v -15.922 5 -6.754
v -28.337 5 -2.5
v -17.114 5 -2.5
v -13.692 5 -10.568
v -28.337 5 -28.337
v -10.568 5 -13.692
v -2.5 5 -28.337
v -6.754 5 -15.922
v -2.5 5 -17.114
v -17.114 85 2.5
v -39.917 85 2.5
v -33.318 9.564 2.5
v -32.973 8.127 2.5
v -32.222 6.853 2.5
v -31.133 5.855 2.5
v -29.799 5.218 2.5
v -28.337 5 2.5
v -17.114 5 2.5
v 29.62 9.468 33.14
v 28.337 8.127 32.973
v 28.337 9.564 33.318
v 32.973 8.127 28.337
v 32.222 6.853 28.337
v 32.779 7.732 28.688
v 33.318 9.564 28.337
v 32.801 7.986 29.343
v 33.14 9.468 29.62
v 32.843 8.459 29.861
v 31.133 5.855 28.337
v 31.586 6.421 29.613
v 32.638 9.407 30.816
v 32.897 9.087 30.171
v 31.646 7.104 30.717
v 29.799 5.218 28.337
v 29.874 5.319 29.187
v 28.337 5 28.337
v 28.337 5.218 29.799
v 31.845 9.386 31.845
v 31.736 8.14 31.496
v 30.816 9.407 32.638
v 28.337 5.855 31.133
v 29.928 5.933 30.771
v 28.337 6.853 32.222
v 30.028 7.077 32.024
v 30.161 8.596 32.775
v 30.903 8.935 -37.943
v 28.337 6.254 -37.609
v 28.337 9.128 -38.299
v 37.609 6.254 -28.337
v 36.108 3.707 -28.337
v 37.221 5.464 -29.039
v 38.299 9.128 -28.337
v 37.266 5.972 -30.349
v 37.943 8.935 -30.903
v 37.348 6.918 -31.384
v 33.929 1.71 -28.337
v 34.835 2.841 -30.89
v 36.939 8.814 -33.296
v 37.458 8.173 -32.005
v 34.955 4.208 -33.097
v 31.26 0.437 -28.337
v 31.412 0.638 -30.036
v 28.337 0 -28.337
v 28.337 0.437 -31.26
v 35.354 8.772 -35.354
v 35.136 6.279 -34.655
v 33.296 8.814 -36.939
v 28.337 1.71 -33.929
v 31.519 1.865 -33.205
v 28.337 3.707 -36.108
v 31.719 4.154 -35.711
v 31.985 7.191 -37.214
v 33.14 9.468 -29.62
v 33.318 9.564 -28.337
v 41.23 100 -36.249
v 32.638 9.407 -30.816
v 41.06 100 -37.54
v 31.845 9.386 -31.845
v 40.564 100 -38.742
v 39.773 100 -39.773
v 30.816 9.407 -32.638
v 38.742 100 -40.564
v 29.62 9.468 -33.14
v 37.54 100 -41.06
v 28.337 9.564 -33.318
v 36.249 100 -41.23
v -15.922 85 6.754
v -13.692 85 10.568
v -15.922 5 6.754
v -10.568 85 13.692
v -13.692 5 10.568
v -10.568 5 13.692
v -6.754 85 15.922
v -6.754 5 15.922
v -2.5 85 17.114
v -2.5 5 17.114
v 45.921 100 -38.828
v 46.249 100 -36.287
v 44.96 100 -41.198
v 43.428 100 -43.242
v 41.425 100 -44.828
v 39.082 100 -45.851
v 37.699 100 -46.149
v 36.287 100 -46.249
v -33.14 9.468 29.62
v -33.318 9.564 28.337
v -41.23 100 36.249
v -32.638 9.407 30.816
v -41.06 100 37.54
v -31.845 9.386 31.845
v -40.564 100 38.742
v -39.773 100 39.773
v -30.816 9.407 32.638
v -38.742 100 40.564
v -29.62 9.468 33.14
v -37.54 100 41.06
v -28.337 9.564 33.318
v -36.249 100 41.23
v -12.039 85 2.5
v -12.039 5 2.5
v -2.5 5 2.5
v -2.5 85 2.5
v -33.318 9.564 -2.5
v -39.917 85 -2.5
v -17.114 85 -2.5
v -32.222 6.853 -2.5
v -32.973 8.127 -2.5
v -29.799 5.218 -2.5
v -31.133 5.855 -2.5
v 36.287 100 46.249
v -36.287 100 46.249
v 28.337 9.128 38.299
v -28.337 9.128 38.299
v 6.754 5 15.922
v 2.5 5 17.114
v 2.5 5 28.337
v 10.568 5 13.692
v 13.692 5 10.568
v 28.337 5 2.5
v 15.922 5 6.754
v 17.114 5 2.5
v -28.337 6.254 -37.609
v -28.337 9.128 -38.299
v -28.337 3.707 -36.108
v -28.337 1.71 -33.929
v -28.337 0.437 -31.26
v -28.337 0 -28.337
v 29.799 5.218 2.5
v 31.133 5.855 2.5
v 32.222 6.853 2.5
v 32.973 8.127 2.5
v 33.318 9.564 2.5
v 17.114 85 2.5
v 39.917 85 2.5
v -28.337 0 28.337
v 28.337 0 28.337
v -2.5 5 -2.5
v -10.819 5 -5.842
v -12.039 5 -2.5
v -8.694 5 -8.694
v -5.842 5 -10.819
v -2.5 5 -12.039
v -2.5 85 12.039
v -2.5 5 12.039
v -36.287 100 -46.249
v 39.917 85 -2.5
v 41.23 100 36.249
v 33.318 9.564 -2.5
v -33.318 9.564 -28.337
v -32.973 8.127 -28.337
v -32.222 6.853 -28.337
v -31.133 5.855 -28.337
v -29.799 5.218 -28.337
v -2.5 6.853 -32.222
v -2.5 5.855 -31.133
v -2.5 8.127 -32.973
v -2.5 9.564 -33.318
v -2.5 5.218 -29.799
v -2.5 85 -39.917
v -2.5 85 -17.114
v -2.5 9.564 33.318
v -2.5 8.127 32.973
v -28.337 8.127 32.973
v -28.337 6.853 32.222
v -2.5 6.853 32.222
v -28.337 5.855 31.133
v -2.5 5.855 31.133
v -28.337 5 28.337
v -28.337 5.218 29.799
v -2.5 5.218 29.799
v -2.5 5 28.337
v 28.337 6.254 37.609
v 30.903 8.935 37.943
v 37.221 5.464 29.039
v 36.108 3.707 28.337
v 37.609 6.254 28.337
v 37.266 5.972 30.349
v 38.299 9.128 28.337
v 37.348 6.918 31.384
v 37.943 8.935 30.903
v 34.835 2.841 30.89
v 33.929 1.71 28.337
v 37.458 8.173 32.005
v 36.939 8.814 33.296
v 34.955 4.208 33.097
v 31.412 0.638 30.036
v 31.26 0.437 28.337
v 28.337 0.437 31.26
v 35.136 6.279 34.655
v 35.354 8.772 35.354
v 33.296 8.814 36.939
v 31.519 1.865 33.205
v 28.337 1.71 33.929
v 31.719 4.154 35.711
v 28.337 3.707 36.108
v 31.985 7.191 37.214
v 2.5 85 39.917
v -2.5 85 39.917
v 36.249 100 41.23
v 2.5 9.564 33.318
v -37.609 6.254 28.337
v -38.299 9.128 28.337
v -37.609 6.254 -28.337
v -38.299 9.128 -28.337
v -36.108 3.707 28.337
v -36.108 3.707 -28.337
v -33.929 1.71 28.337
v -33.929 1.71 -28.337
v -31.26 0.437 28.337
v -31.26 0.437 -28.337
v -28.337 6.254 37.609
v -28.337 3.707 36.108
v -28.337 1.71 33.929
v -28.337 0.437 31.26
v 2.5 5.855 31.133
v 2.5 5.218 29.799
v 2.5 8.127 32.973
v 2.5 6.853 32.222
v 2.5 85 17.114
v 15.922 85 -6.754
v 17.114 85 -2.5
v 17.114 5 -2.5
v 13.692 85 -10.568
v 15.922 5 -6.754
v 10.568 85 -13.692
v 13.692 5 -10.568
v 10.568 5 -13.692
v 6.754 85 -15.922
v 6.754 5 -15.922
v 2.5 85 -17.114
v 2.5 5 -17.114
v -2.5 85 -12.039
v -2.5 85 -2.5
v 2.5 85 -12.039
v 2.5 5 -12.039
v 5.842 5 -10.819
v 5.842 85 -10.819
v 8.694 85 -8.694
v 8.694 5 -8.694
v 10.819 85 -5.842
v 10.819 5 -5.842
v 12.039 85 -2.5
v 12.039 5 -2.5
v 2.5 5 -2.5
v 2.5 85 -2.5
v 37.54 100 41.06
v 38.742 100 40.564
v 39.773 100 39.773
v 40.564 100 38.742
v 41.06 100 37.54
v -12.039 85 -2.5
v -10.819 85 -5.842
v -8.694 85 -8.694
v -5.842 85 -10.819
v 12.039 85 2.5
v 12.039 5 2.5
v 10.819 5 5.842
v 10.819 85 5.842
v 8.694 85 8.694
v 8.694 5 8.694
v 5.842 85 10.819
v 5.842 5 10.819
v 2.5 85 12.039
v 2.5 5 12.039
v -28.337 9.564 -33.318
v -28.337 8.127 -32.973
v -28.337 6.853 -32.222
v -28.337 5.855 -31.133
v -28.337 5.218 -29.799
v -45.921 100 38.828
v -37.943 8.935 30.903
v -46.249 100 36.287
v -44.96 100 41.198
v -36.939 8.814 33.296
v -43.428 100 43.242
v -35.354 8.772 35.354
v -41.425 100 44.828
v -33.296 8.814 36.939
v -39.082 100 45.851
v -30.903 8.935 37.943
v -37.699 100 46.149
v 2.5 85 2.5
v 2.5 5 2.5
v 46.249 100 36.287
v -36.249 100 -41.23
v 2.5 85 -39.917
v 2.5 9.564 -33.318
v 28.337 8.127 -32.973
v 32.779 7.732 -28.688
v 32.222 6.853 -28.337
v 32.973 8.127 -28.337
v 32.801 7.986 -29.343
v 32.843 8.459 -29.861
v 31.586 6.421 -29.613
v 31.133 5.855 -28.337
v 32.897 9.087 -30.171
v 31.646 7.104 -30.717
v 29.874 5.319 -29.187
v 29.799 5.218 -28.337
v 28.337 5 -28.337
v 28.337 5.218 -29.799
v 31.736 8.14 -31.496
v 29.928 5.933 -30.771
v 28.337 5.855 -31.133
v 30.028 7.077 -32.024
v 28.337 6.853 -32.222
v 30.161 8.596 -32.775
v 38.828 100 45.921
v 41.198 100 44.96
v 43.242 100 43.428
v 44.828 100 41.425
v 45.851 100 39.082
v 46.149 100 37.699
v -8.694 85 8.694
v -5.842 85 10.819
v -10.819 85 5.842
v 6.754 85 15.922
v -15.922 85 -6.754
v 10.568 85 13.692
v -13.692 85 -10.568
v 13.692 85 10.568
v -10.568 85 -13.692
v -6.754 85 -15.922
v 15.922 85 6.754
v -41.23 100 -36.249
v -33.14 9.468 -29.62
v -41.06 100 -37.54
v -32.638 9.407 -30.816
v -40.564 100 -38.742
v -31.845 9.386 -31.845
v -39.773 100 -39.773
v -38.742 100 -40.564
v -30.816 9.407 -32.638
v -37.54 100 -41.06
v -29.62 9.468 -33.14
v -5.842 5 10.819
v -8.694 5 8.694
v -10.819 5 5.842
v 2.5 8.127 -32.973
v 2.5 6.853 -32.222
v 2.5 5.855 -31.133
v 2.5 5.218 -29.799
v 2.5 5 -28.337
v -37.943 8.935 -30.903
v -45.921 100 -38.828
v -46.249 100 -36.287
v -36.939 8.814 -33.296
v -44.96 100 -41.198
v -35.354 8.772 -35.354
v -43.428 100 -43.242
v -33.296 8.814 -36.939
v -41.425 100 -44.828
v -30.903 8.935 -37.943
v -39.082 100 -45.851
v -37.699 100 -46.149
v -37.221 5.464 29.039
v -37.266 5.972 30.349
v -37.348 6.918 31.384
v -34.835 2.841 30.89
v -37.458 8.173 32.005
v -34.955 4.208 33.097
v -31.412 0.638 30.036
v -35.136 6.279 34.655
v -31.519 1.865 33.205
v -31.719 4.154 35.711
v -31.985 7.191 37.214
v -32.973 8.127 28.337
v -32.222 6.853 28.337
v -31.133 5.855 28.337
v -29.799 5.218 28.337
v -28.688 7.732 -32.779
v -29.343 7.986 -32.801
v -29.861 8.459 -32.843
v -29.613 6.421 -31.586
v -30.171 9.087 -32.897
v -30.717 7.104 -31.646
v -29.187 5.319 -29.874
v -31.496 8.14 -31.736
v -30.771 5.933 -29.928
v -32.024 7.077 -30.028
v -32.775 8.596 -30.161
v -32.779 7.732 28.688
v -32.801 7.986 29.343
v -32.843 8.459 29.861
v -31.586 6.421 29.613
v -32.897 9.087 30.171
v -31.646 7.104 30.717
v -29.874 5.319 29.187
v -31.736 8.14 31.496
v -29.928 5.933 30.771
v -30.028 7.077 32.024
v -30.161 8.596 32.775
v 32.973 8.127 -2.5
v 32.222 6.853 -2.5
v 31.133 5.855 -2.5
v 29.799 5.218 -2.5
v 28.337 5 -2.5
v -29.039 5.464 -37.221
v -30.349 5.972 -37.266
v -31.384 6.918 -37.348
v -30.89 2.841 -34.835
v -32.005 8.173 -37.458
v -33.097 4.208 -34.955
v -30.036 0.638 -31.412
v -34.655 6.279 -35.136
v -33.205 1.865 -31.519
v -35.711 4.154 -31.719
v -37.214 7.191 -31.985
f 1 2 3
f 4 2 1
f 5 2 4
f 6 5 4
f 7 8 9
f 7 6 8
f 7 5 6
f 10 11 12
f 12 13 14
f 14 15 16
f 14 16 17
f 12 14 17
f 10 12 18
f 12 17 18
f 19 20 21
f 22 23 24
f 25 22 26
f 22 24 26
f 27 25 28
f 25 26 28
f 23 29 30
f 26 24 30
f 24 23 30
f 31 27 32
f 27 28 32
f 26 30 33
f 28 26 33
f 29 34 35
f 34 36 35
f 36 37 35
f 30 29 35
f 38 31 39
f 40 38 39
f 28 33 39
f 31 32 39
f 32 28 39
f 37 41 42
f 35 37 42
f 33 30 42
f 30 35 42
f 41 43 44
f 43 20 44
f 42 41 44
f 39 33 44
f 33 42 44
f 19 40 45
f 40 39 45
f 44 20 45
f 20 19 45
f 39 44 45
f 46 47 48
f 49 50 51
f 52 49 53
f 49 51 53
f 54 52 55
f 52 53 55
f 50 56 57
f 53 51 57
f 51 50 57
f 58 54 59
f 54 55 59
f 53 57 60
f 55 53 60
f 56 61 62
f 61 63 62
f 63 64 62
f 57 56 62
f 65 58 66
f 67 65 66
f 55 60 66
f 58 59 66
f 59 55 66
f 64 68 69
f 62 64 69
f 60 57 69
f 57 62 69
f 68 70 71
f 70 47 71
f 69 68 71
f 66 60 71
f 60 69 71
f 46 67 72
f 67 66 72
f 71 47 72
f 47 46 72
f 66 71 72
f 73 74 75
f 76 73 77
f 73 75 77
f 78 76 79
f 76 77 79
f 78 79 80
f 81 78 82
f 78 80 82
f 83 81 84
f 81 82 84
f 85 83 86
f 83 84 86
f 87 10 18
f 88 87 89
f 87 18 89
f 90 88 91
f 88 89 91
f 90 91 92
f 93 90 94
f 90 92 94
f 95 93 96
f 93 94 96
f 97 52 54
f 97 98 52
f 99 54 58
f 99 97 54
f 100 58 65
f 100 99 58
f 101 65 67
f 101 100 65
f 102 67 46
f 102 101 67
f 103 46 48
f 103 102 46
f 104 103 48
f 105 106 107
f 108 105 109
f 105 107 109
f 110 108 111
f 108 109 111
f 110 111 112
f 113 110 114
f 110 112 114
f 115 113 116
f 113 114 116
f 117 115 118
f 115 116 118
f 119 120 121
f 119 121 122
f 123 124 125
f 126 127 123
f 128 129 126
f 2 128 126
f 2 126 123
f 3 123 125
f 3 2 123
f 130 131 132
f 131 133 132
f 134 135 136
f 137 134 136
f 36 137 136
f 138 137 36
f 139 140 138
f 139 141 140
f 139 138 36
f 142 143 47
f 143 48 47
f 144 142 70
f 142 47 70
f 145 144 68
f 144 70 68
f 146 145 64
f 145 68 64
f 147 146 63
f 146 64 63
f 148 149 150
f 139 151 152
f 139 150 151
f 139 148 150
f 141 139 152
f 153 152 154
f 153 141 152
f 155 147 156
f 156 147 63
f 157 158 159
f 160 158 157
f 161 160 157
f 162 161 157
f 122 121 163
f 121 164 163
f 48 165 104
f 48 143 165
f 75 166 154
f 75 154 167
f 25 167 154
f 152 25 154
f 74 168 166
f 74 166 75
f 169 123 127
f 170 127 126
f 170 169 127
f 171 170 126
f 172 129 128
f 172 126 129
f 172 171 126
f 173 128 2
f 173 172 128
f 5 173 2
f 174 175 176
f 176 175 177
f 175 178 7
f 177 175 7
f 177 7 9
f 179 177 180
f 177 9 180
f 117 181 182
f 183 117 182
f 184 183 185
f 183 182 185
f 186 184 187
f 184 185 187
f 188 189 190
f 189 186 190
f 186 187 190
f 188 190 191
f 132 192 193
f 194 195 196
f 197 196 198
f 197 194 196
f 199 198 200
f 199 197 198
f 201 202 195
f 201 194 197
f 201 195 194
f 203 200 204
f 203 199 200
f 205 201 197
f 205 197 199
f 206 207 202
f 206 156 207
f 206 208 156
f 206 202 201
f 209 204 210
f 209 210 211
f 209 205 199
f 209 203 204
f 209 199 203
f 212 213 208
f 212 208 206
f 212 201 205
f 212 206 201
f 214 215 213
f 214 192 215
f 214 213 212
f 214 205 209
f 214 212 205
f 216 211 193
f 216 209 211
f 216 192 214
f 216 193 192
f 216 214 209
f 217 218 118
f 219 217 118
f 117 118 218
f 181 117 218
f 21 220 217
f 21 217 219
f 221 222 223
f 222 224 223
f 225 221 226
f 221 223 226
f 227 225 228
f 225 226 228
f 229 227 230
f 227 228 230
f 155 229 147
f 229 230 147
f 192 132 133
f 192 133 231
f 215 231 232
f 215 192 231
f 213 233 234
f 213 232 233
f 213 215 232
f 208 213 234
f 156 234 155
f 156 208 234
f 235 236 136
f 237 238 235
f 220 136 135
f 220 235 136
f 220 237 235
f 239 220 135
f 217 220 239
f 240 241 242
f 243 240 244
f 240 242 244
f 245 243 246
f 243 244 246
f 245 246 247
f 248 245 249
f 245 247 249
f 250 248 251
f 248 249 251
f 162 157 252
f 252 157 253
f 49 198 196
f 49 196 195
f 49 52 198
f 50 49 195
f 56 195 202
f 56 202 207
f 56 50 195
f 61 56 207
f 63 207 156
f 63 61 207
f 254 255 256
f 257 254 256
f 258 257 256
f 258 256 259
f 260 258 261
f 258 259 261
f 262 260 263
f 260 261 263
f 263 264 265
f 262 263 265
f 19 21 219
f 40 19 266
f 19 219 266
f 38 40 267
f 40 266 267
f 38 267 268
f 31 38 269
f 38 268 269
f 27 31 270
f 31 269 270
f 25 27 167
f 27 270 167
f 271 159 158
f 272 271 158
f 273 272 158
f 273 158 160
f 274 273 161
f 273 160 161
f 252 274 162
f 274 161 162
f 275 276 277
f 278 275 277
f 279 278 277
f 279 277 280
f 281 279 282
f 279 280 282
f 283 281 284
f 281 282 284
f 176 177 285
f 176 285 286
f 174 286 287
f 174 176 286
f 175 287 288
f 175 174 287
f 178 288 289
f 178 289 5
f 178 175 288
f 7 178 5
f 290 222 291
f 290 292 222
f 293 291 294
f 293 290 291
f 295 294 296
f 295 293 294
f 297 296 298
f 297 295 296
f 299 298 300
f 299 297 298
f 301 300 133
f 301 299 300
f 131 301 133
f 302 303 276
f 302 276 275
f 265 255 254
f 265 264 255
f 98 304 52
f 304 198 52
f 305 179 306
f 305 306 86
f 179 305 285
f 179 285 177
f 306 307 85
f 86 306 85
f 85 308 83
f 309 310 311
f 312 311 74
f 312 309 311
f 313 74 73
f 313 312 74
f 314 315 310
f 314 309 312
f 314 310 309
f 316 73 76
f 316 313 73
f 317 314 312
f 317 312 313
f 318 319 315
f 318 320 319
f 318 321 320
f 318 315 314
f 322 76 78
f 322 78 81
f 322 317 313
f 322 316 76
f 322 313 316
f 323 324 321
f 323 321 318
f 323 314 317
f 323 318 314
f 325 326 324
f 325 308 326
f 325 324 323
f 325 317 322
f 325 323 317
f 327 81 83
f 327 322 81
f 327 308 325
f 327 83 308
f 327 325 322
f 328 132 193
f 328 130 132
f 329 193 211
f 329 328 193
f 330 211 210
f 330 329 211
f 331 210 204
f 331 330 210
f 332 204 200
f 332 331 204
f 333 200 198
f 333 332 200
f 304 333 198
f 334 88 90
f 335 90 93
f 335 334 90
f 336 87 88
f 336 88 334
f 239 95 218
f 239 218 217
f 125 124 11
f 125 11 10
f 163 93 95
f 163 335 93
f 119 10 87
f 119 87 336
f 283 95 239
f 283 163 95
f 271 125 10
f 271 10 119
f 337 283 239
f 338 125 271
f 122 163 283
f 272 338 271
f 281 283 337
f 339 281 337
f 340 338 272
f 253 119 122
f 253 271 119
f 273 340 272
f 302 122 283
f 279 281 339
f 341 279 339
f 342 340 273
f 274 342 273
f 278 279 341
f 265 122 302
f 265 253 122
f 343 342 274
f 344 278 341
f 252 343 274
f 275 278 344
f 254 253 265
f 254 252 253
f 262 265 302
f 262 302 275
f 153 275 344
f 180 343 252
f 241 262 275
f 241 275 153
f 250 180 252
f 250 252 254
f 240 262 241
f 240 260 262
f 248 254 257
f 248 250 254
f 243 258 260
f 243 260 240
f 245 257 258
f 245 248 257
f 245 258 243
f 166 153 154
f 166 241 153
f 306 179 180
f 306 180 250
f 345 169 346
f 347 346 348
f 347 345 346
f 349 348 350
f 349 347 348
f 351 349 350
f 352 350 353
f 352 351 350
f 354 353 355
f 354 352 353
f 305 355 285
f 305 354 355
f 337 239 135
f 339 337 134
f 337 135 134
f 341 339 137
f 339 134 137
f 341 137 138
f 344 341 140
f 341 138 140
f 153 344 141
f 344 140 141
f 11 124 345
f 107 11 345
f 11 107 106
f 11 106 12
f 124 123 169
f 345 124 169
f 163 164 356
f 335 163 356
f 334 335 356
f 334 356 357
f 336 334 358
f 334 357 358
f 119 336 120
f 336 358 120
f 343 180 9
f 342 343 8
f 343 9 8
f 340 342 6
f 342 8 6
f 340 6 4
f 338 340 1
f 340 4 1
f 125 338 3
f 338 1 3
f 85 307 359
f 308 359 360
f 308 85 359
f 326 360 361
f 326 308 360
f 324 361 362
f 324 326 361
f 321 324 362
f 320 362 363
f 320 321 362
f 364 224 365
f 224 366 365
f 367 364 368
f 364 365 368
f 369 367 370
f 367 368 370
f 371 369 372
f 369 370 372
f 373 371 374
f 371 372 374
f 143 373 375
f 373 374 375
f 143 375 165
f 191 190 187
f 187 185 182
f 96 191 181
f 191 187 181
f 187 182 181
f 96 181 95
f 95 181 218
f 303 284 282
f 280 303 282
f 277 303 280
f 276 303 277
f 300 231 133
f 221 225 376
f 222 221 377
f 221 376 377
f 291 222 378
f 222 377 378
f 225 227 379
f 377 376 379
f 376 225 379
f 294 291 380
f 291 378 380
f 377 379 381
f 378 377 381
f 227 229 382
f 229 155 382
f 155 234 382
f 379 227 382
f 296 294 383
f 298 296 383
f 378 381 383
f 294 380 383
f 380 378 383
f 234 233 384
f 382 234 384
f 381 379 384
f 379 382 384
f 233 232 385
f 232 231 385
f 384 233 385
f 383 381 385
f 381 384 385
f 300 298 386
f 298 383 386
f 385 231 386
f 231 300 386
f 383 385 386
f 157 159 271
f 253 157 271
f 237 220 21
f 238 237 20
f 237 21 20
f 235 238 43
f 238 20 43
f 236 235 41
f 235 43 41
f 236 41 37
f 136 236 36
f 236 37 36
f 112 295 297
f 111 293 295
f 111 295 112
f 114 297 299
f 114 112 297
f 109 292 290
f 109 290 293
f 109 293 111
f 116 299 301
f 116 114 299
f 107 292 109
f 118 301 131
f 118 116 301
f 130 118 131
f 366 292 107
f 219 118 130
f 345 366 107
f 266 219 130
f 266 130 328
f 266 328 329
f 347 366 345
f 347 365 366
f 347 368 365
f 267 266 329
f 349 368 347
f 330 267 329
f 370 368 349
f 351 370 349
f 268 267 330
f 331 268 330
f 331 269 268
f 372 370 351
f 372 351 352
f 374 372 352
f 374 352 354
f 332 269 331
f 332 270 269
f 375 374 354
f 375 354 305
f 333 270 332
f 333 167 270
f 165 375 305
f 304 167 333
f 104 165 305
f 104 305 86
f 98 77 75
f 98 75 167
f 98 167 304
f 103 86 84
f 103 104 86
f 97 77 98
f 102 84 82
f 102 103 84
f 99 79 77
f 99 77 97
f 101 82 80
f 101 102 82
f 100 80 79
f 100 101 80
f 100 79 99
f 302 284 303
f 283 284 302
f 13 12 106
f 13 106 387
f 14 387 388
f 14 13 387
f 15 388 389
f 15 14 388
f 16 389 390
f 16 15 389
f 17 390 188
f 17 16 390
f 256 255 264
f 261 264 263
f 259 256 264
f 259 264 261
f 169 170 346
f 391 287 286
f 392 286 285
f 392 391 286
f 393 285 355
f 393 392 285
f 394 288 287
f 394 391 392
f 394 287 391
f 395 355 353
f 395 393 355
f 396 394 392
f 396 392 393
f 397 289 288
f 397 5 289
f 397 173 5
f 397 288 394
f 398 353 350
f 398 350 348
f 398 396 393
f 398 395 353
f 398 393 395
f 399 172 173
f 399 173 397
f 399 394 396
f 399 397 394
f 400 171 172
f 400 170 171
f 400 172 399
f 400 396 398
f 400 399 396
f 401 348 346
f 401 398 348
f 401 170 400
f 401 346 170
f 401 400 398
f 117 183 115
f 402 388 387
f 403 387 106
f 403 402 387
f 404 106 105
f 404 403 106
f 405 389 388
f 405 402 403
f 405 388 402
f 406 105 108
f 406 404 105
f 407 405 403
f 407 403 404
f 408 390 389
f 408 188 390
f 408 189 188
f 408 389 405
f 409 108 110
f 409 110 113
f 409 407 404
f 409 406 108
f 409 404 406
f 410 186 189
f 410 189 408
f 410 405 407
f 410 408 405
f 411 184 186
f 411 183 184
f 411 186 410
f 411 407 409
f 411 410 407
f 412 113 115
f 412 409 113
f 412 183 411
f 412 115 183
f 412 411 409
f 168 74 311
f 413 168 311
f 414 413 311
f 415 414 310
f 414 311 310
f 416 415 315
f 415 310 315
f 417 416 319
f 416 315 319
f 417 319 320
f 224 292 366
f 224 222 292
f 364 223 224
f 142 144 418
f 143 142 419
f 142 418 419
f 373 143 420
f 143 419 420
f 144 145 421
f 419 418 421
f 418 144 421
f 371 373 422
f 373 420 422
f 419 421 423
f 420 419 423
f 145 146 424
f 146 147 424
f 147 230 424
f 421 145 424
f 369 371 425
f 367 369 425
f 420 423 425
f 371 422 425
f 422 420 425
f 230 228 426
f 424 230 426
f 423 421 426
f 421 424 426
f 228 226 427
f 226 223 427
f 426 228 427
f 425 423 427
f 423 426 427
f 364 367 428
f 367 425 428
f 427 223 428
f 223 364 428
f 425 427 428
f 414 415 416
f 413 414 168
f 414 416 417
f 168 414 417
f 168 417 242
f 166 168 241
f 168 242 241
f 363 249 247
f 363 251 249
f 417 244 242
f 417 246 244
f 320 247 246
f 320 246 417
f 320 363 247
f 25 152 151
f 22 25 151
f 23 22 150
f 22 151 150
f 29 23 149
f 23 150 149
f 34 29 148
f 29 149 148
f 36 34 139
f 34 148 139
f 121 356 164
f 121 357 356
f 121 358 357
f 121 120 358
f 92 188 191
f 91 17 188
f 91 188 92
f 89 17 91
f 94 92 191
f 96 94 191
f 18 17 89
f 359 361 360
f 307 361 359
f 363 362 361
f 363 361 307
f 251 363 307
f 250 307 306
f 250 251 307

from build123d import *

# Parameters (mm, degrees)
SKETCH1_W          = 75
SKETCH1_H          = 75
BASE_EXTRUDE_DEPTH = 100
BASE_EXTRUDE_DRAFT = -5
FILLET1_R          = 10
SHELL1_T           = -5
RIB1_START         = -2.5
RIB1_DEPTH         = 5
RIB1_START_2       = -36.248793674
RIB1_2_OUTLINE_W   = 80
RIB1_2_OUTLINE_H   = 5
RIB1_2_DEPTH       = 72.497587348
RIB1_START_3       = 5
RIB1_3_DEPTH       = 80
RIB1_START_4       = 43.067212481
RIB1_4_OUTLINE_W   = 3.751206326
RIB1_4_OUTLINE_H   = 5
RIB1_4_DEPTH       = 41.932787519


with BuildPart() as part:
    # Sketch1 → Base-Extrude (with draft: the straight prism first)
    with BuildSketch(Plane(origin=(0, 0, 0), x_dir=(1, 0, 0), z_dir=(0, 1, 0))):
        Rectangle(SKETCH1_W, SKETCH1_H)
    extrude(amount=BASE_EXTRUDE_DEPTH)
    # Base-Extrude: the draft: its side faces are tilted about the plane it starts from
    base_extrude_sides = [part.faces().sort_by_distance(p)[0] for p in [
        (0, 50, -37.5),
        (-37.5, 50, 0),
        (0, 50, 37.5),
        (37.5, 50, 0),
    ]]
    draft(base_extrude_sides, Plane(origin=(0, 0, 0), x_dir=(1, 0, 0), z_dir=(0, 1, 0)), BASE_EXTRUDE_DRAFT)

    # Fillet1
    fillet1_edges = [part.edges().sort_by_distance(p)[0] for p in [
        (0, 0, 37.5),
        (-37.5, 0, 0),
        (0, 0, -37.5),
        (37.5, 0, 0),
        (41.874433176, 50, 41.874433176),
        (-41.874433176, 50, 41.874433176),
        (-41.874433176, 50, -41.874433176),
        (41.874433176, 50, -41.874433176),
    ]]
    fillet(fillet1_edges, radius=FILLET1_R)

    # Shell1
    shell1_openings = [part.faces().sort_by_distance(p)[0] for p in [
        (0, 100, 0),
    ]]
    offset(amount=SHELL1_T, openings=shell1_openings, kind=Kind.INTERSECTION)

    # Rib1: read off the stored shape, not the designer's step
    # Rib1 outline → Rib1 (add)
    with BuildSketch(Plane.YZ.offset(RIB1_START)):
        with BuildLine():
            Line((85, 39.917437212), (9.564221286, 33.31766175))
            ThreePointArc((9.564221286, 33.31766175), (6.313613316, 31.714639298), (5, 28.33668826))
            Line((5, 28.33668826), (5, -28.33668826))
            ThreePointArc((5, -28.33668826), (6.313613316, -31.714639298), (9.564221286, -33.31766175))
            Line((9.564221286, -33.31766175), (85, -39.917437212))
            Line((85, -39.917437212), (85, 39.917437212))
        make_face()
    extrude(amount=RIB1_DEPTH)

    # Rib1 2 outline → Rib1 2 (add)
    with BuildSketch(Plane.YZ.offset(RIB1_START_2)):
        with Locations((45, 0)):
            Rectangle(RIB1_2_OUTLINE_W, RIB1_2_OUTLINE_H)
    extrude(amount=RIB1_2_DEPTH)

    # Rib1 3 outline → Rib1 3 (add)
    with BuildSketch(Plane(origin=(0, 0, 0), x_dir=(1, 0, 0), z_dir=(0, 1, 0)).offset(RIB1_START_3)):
        with BuildLine():
            ThreePointArc((-2.5, -12.038877834), (-8.694382655, -8.694382655), (-12.038877834, -2.5))
            Line((-12.038877834, -2.5), (-17.11407953, -2.5))
            ThreePointArc((-17.11407953, -2.5), (-12.229916561, -12.229916561), (-2.5, -17.11407953))
            Line((-2.5, -17.11407953), (-2.5, -12.038877834))
        make_face()
        with BuildLine():
            ThreePointArc((2.5, -17.11407953), (12.229916561, -12.229916561), (17.11407953, -2.5))
            Line((17.11407953, -2.5), (12.038877834, -2.5))
            ThreePointArc((12.038877834, -2.5), (8.694382655, -8.694382655), (2.5, -12.038877834))
            Line((2.5, -12.038877834), (2.5, -17.11407953))
        make_face()
        with BuildLine():
            Line((-17.11407953, 2.5), (-12.038877834, 2.5))
            ThreePointArc((-12.038877834, 2.5), (-8.694382655, 8.694382655), (-2.5, 12.038877834))
            Line((-2.5, 12.038877834), (-2.5, 17.11407953))
            ThreePointArc((-2.5, 17.11407953), (-12.229916561, 12.229916561), (-17.11407953, 2.5))
        make_face()
        with BuildLine():
            ThreePointArc((17.11407953, 2.5), (12.229916561, 12.229916561), (2.5, 17.11407953))
            Line((2.5, 17.11407953), (2.5, 12.038877834))
            ThreePointArc((2.5, 12.038877834), (8.694382655, 8.694382655), (12.038877834, 2.5))
            Line((12.038877834, 2.5), (17.11407953, 2.5))
        make_face()
    extrude(amount=RIB1_3_DEPTH)

    # Rib1 4 outline → Rib1 4 (add)
    with BuildSketch(Plane(origin=(0, 0, 0), x_dir=(1, 0, 0), z_dir=(0, 1, 0)).offset(RIB1_START_4)):
        with Locations((-38.124396837, 0)):
            Rectangle(RIB1_4_OUTLINE_W, RIB1_4_OUTLINE_H)
        with Locations((38.124396837, 0)):
            Rectangle(RIB1_4_OUTLINE_W, RIB1_4_OUTLINE_H)
    extrude(amount=RIB1_4_DEPTH)


solid = part.part
